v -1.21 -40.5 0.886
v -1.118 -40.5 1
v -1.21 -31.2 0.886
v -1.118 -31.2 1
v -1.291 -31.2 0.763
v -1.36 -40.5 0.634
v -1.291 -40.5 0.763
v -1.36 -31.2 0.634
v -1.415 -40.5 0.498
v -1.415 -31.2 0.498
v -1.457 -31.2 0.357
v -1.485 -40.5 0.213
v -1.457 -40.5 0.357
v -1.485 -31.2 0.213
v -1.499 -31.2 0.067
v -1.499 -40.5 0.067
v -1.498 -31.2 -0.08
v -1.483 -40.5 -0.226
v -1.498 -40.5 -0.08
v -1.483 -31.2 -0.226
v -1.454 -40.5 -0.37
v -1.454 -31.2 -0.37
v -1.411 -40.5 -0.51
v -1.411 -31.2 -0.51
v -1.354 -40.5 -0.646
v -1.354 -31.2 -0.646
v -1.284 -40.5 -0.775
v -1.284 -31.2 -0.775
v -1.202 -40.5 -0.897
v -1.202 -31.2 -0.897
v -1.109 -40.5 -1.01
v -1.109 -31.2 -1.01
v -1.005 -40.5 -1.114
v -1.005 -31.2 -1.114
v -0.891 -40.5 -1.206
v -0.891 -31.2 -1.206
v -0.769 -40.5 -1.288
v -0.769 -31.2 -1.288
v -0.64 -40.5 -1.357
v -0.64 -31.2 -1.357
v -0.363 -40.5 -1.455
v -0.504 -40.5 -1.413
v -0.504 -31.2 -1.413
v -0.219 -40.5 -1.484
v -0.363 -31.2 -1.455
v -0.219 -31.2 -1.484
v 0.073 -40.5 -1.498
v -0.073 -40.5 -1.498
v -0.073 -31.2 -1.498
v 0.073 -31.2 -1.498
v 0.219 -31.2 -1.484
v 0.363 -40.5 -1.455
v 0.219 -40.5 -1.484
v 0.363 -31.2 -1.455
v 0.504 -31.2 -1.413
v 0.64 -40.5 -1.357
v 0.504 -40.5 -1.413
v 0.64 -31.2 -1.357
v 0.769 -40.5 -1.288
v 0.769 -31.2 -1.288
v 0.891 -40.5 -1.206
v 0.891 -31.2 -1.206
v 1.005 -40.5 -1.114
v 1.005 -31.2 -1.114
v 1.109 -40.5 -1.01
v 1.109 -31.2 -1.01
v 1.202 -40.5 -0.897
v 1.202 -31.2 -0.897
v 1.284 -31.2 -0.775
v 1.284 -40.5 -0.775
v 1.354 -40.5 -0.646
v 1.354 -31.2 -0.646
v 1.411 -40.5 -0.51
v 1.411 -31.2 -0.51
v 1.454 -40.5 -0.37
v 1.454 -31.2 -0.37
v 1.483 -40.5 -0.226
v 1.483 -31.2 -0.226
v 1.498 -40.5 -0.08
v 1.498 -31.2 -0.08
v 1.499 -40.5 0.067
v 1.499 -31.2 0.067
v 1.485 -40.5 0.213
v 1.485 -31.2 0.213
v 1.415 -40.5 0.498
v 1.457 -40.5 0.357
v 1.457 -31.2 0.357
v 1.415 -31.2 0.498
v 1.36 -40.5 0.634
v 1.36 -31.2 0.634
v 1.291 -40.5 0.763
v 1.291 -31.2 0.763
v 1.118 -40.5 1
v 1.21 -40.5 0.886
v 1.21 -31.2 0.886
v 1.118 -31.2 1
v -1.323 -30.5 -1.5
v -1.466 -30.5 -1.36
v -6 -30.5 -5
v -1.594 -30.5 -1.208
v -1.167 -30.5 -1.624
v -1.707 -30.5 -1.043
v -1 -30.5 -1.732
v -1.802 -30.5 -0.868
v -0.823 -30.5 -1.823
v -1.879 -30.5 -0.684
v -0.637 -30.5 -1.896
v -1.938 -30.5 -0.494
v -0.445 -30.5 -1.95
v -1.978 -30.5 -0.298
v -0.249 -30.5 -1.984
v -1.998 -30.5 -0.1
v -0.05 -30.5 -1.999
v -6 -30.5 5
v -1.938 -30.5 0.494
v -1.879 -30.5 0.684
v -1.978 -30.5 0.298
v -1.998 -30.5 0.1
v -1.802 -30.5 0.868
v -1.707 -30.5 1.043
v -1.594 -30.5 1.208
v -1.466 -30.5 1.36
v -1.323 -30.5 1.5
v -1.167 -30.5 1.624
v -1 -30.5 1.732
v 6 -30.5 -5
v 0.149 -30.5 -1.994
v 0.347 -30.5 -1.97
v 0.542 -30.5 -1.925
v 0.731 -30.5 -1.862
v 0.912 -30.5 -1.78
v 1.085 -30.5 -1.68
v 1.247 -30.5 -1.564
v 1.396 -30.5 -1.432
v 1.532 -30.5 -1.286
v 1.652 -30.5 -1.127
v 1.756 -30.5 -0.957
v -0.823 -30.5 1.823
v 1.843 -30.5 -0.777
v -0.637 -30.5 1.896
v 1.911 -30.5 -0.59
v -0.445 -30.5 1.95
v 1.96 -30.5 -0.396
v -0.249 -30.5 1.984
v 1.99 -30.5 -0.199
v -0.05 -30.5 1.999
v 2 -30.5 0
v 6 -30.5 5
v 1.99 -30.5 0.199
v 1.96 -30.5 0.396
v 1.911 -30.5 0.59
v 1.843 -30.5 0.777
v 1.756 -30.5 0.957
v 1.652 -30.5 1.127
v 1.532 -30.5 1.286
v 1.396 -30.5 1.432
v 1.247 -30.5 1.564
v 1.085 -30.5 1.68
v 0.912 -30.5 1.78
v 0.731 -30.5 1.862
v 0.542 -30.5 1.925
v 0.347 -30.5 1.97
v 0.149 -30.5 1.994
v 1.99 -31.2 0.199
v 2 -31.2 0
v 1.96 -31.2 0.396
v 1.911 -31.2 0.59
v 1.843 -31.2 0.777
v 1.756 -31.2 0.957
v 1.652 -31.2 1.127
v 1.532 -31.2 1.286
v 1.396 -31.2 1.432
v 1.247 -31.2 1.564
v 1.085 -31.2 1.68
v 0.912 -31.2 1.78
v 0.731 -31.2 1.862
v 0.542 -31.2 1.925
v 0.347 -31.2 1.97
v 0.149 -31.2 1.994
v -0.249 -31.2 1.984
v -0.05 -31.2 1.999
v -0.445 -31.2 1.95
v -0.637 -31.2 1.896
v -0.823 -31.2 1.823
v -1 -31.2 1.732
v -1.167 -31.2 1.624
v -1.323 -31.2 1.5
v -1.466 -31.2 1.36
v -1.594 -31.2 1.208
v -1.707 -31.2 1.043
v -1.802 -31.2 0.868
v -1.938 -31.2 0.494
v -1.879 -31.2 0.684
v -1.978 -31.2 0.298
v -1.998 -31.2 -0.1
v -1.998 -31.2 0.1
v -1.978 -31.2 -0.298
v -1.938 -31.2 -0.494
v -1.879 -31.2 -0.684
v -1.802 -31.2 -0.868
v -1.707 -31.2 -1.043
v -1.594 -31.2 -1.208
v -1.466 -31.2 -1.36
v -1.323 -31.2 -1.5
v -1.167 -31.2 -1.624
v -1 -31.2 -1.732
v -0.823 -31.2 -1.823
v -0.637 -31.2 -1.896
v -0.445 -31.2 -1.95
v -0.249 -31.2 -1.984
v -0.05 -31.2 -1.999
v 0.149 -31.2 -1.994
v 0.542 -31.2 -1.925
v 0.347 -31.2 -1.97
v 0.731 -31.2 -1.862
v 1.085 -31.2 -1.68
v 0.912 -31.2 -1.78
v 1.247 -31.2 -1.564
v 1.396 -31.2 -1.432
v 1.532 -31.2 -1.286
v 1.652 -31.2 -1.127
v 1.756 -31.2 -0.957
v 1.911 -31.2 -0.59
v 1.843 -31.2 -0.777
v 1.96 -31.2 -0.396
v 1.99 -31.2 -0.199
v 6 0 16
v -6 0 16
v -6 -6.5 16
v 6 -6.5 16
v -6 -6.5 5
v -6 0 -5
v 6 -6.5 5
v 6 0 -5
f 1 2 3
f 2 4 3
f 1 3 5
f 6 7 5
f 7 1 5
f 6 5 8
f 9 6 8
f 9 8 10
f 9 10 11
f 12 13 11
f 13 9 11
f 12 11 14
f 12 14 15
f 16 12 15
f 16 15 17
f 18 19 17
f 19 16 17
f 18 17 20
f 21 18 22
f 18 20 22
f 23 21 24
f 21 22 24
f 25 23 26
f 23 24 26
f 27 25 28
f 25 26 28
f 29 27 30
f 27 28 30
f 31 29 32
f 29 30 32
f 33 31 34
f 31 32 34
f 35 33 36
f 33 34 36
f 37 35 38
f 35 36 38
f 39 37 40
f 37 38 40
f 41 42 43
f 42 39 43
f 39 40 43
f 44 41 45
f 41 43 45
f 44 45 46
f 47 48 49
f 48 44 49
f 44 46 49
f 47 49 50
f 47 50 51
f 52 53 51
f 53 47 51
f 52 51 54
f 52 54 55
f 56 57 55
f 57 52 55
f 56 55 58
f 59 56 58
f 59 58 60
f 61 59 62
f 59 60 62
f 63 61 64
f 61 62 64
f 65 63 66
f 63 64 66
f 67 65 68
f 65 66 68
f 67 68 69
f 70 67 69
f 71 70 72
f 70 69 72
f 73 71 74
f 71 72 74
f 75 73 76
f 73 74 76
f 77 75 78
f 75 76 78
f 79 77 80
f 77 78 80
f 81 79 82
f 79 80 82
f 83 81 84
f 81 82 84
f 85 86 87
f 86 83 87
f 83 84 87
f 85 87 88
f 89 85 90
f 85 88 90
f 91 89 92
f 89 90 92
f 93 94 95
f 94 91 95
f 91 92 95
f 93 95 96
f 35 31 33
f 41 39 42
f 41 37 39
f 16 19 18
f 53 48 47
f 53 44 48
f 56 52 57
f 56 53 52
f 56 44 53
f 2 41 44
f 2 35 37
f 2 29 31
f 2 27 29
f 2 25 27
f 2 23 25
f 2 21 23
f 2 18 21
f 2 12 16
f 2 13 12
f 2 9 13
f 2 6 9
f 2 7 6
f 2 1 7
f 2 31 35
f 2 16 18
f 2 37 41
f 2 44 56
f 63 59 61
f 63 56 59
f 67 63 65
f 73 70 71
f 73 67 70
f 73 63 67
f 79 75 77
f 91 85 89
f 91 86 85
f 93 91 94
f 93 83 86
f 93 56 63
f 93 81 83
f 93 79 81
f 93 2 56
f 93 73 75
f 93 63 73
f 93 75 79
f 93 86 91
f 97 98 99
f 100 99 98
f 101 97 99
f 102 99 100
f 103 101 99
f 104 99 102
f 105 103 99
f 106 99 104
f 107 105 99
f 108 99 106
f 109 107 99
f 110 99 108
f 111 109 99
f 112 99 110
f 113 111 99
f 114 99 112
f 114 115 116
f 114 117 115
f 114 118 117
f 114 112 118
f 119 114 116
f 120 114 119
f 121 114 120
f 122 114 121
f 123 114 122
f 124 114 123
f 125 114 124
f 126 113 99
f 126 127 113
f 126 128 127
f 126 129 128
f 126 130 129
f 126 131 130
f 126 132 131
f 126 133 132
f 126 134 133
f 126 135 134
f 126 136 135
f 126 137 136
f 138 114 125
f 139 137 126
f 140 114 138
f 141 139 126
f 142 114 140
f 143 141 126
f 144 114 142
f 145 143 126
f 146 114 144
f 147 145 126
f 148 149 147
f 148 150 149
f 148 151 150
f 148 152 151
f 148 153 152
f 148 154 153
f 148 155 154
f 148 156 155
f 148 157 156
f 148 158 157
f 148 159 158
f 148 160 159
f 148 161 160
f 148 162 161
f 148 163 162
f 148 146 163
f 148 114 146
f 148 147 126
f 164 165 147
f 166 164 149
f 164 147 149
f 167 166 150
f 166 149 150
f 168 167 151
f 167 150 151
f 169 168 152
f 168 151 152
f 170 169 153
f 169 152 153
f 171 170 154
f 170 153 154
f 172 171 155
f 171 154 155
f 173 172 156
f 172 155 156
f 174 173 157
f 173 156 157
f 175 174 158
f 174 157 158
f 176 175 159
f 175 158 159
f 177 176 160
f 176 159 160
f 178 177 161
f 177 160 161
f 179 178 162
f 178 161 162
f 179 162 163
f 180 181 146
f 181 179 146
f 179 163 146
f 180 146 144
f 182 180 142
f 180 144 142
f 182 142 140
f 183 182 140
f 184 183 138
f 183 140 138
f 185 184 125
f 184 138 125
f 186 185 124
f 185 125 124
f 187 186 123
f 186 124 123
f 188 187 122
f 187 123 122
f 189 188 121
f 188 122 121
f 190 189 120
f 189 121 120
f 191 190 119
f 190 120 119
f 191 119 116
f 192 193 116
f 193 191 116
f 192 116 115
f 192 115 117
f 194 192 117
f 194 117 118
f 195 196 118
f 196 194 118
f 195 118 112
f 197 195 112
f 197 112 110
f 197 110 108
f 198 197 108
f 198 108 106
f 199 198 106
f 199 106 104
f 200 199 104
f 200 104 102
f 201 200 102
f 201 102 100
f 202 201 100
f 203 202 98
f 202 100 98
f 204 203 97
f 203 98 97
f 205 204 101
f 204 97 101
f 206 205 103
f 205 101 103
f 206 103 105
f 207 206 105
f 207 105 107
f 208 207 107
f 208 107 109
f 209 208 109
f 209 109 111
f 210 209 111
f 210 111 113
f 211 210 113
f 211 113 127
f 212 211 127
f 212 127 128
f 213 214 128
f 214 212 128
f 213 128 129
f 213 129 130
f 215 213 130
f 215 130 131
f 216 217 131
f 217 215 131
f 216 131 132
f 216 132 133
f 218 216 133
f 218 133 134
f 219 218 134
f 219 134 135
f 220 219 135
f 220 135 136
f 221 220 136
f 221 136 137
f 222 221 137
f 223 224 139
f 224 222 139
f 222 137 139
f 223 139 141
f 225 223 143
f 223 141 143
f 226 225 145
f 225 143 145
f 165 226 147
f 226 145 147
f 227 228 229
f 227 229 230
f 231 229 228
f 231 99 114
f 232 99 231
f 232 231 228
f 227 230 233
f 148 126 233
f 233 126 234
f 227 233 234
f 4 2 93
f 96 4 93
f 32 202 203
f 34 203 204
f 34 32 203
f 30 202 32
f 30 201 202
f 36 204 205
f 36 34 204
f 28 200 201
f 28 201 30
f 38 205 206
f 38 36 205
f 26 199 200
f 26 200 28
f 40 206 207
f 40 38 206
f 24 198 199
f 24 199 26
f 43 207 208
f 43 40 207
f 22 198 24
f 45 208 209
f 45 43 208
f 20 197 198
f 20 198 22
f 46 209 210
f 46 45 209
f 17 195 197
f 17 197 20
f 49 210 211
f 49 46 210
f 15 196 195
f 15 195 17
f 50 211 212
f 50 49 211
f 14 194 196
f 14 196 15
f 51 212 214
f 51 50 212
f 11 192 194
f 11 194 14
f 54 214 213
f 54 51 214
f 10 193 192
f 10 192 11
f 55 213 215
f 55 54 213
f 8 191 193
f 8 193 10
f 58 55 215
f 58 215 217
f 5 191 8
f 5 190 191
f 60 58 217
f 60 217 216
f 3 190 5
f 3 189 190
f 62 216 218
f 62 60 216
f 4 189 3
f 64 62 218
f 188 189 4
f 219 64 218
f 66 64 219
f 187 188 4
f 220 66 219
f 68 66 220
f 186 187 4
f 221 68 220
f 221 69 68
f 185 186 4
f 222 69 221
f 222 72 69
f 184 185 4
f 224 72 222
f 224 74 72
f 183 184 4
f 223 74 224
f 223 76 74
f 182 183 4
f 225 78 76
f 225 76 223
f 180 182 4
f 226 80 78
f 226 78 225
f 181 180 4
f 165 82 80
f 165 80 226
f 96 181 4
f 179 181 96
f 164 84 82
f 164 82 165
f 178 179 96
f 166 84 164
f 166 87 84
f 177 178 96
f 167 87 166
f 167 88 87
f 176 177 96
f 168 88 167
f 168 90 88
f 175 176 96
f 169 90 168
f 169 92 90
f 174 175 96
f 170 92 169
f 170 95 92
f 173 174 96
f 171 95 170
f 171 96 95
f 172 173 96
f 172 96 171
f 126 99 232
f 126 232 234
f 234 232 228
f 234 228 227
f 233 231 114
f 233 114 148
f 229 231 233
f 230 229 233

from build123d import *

# Parameters (mm, degrees)
F0_W     = 12
F0_H     = 10
F1_DEPTH = 30.5
F2_R     = 2
F3_DEPTH = 0.7
F4_R     = 1.5
F5_DEPTH = 9.3
F6_W     = 6.687609
F6_H     = 1.676586
F7_DEPTH = 9.3
F8_W     = 12
F8_H     = 6.5
F9_DEPTH = 11


with BuildPart() as f1:
    # F0 (on Front) → F1 (new body)
    with BuildSketch(Plane.XZ):
        Rectangle(F0_W, F0_H)
    extrude(amount=F1_DEPTH)

    # F2 (on face) → F3 (join)
    with BuildSketch(Plane.XZ.offset(30.5)):
        Circle(F2_R)
    extrude(amount=F3_DEPTH)

    # F4 (on face) → F5 (join)
    with BuildSketch(Plane.XZ.offset(31.2)):
        Circle(F4_R)
    extrude(amount=F5_DEPTH)

    # F6 (on face) → F7 (cut)
    with BuildSketch(Plane.XZ.offset(40.5)):
        with Locations((0.224422, 1.838293)):
            Rectangle(F6_W, F6_H)
    extrude(amount=-F7_DEPTH, mode=Mode.SUBTRACT)

    # F8 (on face) → F9 (join)
    with BuildSketch(Plane.XY.offset(5)):
        with Locations((0, -3.25)):
            Rectangle(F8_W, F8_H)
    extrude(amount=F9_DEPTH)


solid = f1.part
